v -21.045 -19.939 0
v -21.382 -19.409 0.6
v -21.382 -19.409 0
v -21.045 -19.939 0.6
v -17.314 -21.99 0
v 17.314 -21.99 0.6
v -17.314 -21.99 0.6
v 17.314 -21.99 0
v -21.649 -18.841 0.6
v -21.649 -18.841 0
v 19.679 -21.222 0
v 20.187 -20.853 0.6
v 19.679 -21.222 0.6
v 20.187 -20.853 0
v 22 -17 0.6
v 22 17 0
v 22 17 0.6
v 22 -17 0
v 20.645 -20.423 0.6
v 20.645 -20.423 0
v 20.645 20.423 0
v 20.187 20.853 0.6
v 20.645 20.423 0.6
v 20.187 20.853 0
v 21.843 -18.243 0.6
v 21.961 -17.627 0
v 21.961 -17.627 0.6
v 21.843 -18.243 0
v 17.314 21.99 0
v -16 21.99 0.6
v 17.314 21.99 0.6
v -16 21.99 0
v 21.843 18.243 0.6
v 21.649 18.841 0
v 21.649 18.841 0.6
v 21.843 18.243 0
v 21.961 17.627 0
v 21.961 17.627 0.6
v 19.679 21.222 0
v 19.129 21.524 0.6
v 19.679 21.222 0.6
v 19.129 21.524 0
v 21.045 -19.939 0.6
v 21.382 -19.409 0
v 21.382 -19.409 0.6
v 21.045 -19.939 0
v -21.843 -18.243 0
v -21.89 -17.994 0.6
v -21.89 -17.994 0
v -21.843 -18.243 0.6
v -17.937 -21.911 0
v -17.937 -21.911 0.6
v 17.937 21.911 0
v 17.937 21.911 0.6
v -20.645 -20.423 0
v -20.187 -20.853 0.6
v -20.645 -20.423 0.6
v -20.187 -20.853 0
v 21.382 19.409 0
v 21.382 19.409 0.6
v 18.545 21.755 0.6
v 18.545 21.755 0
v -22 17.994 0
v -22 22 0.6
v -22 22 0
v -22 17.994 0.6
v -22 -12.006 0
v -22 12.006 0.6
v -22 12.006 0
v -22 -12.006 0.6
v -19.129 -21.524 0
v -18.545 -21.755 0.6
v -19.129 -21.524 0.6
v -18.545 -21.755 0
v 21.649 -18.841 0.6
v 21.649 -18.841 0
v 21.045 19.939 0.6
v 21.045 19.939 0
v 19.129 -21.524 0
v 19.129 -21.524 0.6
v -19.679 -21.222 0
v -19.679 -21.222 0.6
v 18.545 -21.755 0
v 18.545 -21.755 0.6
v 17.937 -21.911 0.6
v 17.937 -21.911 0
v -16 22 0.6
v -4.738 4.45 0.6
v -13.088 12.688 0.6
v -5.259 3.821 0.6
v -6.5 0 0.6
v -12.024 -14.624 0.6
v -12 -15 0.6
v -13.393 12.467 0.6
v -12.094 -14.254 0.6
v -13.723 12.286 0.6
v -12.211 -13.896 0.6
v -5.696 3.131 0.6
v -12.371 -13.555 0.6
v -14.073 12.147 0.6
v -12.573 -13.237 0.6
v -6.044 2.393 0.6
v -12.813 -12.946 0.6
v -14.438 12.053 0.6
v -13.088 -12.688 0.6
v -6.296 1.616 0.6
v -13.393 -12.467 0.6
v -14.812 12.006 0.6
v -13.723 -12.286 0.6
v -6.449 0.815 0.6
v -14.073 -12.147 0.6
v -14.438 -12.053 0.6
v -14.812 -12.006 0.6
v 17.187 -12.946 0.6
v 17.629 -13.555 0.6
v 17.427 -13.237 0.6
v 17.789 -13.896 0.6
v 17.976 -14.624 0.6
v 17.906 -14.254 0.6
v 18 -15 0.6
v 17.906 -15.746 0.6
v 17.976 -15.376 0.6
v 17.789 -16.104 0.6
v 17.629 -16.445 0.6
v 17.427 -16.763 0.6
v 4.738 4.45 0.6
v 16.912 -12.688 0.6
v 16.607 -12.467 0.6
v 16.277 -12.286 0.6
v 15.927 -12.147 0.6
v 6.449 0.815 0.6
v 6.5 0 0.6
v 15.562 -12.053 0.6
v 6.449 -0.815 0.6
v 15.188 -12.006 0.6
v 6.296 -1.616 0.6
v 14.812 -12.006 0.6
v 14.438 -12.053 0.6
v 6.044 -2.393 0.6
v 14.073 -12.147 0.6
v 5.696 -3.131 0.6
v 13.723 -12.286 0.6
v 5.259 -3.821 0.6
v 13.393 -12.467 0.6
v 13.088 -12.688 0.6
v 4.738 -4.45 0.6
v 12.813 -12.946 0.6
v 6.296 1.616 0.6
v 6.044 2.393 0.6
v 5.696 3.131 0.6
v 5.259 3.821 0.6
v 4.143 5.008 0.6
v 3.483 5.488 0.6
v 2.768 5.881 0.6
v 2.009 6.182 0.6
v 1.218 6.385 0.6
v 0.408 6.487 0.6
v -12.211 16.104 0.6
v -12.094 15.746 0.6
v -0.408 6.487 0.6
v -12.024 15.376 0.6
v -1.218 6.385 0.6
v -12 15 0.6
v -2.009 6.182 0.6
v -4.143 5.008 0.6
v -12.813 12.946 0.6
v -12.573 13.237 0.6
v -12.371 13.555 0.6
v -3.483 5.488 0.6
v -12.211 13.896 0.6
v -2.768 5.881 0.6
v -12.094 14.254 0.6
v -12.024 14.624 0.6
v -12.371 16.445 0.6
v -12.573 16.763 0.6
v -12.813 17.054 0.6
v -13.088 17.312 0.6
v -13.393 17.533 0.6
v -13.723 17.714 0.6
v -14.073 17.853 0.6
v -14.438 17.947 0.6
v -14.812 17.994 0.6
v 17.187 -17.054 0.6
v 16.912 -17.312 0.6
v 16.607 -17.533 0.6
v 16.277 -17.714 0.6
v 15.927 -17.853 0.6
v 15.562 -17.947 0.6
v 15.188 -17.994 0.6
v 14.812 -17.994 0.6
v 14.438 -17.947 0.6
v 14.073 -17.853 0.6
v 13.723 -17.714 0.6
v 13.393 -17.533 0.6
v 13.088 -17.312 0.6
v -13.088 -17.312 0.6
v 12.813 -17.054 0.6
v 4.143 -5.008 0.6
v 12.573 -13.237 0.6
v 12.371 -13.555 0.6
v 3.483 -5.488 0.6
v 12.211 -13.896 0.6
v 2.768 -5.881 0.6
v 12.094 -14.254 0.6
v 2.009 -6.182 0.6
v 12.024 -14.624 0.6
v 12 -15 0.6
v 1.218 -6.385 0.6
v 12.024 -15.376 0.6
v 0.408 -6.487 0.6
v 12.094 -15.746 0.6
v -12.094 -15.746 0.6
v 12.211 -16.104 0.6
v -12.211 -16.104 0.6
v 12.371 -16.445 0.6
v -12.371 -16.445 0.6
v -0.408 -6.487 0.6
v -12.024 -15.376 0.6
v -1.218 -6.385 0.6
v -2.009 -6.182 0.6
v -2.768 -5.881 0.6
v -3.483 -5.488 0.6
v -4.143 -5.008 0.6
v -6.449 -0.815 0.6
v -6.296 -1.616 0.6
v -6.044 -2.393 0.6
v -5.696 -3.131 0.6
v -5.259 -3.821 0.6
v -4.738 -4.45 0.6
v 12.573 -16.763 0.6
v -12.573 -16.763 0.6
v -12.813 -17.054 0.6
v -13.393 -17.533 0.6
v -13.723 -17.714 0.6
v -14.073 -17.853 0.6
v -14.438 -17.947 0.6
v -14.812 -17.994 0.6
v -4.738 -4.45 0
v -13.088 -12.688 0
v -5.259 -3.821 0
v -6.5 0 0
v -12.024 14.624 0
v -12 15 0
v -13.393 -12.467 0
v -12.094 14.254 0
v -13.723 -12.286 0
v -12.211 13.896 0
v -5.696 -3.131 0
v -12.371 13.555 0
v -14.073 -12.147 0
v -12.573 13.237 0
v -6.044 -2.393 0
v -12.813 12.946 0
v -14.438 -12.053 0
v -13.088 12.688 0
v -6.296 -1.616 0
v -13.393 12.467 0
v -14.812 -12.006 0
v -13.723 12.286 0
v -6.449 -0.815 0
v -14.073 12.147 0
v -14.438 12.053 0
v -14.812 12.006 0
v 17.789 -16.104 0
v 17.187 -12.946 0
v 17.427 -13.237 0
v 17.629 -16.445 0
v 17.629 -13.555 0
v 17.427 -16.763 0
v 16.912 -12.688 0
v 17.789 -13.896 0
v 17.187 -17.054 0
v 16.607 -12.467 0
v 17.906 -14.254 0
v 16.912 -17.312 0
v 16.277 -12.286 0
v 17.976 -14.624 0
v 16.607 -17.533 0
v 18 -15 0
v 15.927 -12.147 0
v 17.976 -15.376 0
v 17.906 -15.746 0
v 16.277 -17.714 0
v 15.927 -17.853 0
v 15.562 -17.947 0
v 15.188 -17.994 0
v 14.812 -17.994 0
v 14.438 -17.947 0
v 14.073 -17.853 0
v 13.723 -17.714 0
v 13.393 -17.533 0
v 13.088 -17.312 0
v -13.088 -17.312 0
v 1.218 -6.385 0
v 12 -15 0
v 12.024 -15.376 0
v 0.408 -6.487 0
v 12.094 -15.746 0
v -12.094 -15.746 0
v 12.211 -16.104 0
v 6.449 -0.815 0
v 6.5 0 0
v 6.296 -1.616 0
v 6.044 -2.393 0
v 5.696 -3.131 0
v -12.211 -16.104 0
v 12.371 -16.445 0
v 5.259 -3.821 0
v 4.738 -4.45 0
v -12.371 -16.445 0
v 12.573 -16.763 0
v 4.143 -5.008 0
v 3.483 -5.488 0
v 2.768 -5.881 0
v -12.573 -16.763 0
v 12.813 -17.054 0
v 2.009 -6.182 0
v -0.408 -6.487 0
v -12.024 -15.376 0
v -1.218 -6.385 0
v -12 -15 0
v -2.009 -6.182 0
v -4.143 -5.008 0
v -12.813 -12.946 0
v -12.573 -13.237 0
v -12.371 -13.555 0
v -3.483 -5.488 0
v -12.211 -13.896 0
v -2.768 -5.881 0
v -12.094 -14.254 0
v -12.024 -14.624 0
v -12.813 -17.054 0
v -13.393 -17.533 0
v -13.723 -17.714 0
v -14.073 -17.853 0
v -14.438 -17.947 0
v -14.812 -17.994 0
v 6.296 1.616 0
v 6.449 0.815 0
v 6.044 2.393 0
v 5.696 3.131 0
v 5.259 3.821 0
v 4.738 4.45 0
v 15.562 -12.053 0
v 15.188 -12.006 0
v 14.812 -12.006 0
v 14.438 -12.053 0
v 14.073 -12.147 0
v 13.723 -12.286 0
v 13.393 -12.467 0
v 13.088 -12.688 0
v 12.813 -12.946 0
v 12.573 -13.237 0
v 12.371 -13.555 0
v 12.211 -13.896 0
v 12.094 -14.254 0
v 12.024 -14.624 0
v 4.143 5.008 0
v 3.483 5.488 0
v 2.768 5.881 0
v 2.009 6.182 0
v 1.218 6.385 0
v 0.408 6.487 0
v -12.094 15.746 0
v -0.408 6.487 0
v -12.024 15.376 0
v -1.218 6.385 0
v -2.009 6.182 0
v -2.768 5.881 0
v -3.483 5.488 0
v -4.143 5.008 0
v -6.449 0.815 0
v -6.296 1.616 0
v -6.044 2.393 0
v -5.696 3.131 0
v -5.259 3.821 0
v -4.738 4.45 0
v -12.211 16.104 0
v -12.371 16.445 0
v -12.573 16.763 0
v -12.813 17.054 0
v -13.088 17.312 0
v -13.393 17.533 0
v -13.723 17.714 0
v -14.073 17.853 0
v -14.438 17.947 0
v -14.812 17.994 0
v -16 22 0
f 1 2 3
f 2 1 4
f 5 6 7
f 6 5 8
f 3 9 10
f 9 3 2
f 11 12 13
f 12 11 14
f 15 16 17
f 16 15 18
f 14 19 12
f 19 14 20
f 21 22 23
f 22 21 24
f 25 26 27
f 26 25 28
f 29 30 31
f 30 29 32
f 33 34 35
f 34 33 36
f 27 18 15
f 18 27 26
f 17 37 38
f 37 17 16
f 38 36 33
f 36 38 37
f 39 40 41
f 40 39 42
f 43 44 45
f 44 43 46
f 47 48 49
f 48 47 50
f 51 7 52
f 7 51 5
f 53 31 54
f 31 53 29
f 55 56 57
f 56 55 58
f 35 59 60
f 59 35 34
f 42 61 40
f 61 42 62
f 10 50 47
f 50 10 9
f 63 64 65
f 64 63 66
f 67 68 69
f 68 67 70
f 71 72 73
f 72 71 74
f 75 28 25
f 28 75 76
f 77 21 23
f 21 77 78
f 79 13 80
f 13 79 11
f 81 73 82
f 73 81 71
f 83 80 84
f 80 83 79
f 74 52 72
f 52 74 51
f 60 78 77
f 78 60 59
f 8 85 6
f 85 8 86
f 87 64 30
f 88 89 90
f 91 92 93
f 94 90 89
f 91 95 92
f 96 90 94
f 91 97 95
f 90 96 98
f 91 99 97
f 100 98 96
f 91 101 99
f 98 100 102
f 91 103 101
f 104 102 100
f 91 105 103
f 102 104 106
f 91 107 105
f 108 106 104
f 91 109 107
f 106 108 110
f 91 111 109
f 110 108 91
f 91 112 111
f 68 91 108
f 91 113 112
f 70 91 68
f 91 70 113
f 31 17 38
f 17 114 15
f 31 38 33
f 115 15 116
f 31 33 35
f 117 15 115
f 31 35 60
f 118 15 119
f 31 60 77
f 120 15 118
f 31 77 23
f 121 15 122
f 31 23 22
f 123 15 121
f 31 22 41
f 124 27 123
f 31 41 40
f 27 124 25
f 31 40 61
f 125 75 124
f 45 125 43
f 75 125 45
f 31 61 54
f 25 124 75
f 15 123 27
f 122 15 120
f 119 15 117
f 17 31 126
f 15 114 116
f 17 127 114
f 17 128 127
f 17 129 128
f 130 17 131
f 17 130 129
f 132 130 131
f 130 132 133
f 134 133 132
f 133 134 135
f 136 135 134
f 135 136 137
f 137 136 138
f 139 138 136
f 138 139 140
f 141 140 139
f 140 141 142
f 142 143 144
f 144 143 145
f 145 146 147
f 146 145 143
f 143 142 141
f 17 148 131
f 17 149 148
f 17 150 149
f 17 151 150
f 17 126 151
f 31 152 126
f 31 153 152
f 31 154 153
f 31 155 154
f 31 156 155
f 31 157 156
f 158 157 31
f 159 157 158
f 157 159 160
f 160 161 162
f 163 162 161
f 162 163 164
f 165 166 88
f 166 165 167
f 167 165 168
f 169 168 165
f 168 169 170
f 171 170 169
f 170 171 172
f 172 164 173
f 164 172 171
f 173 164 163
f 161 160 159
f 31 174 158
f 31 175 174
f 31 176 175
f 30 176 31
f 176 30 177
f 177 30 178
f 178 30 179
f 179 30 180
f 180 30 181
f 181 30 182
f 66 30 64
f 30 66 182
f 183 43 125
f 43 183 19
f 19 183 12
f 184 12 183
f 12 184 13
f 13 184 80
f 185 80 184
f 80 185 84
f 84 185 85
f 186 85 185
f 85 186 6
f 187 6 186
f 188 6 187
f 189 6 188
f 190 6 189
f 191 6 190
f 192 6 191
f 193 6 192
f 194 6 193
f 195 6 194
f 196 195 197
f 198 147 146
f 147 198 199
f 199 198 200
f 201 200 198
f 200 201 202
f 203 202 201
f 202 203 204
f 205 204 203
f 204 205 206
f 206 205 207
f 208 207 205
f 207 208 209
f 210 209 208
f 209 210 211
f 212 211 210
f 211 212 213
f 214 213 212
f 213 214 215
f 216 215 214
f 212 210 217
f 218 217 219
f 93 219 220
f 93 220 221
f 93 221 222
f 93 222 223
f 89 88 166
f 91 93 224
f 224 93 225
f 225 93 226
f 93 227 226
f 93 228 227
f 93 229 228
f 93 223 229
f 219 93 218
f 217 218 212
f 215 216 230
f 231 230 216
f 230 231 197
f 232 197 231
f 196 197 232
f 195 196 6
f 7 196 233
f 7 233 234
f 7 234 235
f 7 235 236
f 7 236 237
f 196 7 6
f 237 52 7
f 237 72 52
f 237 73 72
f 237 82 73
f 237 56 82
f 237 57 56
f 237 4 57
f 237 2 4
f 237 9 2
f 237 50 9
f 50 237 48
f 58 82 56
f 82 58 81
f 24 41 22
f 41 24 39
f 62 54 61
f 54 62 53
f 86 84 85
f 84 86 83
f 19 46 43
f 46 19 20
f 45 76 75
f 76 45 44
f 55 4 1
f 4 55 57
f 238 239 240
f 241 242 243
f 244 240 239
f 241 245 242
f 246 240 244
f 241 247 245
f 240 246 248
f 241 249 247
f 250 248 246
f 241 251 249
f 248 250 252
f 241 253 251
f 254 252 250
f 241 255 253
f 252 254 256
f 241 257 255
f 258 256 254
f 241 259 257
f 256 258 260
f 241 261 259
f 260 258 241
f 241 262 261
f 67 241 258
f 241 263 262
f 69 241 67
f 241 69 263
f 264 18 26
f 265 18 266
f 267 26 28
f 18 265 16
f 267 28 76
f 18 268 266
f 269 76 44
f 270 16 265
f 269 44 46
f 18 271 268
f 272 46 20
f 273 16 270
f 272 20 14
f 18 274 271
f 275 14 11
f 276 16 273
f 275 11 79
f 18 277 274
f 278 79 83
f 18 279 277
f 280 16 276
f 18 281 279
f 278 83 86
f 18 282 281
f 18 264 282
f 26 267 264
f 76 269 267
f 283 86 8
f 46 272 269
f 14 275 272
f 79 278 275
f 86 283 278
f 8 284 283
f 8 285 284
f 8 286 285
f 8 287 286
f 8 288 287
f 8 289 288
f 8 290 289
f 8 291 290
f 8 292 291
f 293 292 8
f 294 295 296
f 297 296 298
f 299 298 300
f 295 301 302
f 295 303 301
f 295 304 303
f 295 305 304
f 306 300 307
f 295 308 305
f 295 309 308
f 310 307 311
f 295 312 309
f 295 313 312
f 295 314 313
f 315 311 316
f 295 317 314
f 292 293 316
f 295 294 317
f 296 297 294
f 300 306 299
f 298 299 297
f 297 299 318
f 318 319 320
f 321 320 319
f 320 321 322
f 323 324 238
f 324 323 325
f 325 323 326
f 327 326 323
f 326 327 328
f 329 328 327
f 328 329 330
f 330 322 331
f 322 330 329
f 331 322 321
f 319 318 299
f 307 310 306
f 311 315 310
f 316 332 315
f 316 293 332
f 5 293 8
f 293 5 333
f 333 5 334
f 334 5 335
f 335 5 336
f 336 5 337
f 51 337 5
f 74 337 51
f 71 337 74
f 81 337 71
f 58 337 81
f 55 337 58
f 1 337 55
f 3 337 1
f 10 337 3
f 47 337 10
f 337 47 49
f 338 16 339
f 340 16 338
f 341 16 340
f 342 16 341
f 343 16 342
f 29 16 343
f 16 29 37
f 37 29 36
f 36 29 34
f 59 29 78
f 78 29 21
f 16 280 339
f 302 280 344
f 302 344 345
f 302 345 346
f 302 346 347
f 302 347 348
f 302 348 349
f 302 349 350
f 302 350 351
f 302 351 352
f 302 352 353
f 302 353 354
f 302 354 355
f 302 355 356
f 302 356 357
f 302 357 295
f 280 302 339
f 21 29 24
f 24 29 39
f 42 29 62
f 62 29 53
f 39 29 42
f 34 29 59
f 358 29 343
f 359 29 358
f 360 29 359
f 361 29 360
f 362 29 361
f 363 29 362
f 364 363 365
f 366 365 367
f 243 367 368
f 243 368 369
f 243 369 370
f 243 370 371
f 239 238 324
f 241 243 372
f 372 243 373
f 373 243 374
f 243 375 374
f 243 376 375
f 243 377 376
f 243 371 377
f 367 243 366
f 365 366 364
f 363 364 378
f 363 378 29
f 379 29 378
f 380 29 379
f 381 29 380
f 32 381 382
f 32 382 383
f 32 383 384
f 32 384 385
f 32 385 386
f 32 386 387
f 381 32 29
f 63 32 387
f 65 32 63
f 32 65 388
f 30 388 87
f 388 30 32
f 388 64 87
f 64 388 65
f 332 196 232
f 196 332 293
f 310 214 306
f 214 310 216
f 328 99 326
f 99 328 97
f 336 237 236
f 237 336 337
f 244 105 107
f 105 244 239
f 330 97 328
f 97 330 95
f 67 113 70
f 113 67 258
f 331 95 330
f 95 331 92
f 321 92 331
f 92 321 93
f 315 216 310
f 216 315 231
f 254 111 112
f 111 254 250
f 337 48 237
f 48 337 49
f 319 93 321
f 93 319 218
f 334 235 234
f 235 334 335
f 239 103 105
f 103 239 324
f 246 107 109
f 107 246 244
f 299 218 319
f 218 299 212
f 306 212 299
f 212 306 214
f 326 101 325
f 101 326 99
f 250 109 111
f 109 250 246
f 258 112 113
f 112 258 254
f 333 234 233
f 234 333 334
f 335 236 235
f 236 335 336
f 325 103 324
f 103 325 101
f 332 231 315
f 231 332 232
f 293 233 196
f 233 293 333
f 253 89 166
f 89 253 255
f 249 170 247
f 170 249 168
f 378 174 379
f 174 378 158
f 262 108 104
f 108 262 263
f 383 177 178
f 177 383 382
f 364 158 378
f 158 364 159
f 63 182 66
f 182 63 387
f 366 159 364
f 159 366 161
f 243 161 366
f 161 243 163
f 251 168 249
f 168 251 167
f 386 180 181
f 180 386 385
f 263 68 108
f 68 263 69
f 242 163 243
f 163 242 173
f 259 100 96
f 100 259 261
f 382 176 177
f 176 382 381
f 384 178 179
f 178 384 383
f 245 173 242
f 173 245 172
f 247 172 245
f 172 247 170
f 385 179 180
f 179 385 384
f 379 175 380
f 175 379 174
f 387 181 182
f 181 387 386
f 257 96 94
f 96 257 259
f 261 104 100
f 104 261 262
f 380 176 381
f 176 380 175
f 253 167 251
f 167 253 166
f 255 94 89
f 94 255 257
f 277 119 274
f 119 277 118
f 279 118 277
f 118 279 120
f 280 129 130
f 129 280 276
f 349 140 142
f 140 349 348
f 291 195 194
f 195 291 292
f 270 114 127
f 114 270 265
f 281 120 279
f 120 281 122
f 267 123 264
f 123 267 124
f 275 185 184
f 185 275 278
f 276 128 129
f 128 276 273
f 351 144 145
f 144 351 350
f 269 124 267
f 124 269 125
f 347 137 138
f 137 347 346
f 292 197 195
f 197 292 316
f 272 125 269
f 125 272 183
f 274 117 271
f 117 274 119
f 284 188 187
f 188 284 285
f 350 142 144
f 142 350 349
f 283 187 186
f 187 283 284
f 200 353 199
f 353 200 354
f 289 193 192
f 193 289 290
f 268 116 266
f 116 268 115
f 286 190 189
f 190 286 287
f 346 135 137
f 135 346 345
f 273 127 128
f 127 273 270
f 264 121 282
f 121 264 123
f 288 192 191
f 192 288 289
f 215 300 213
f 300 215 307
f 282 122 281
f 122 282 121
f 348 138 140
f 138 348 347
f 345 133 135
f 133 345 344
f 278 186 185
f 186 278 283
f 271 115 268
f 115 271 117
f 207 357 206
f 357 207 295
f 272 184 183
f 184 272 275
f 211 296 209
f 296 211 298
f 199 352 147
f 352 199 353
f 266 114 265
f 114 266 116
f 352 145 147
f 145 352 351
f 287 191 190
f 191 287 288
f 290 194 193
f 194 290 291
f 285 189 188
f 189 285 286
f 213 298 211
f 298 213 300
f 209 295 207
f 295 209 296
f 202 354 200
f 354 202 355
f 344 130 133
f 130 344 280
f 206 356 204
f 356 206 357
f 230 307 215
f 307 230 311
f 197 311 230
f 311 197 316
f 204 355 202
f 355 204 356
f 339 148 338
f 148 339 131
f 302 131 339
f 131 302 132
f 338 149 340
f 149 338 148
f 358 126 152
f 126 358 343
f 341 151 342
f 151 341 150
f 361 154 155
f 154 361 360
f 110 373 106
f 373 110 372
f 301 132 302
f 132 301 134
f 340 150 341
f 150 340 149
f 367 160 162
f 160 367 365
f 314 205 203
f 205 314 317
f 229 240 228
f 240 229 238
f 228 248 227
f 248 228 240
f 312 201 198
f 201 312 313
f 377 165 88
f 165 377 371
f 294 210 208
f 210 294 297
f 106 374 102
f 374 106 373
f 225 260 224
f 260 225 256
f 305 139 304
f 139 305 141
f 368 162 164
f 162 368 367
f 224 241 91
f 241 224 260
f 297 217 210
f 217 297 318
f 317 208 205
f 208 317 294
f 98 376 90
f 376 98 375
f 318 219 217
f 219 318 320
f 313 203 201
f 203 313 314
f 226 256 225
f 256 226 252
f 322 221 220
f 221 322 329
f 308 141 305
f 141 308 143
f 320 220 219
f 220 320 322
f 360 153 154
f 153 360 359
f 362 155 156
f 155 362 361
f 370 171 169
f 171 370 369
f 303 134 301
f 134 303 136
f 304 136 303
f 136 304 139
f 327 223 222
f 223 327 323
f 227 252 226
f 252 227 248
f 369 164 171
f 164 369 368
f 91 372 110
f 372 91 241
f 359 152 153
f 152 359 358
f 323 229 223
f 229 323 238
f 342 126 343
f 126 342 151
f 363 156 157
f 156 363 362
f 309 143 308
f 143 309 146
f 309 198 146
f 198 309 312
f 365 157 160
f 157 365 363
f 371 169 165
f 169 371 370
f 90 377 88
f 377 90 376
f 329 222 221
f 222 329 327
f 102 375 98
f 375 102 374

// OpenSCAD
$fn = 50;


difference() {
	union() {
		translate(v = [0, 0, 0]) {
			rotate(a = [0, 0, 0]) {
				hull() {
					translate(v = [-17.0000000000, 17.0000000000, 0]) {
						rotate(a = [0, 0, 0]) {
							translate(v = [0, 0, 0]) {
								rotate(a = [0, 0, 0]) {
									cylinder(h = 0.6000000000, r = 5);
								}
							}
						}
					}
					translate(v = [17.0000000000, 17.0000000000, 0]) {
						rotate(a = [0, 0, 0]) {
							translate(v = [0, 0, 0]) {
								rotate(a = [0, 0, 0]) {
									cylinder(h = 0.6000000000, r = 5);
								}
							}
						}
					}
					translate(v = [-17.0000000000, -17.0000000000, 0]) {
						rotate(a = [0, 0, 0]) {
							translate(v = [0, 0, 0]) {
								rotate(a = [0, 0, 0]) {
									cylinder(h = 0.6000000000, r = 5);
								}
							}
						}
					}
					translate(v = [17.0000000000, -17.0000000000, 0]) {
						rotate(a = [0, 0, 0]) {
							translate(v = [0, 0, 0]) {
								rotate(a = [0, 0, 0]) {
									cylinder(h = 0.6000000000, r = 5);
								}
							}
						}
					}
				}
			}
		}
		translate(v = [-22.0000000000, 16.0000000000, 0]) {
			rotate(a = [0, 0, 0]) {
				cube(size = [6, 6, 0.6000000000]);
			}
		}
	}
	union() {
		translate(v = [-22.5000000000, -15.0000000000, -125]) {
			rotate(a = [0, 0, 0]) {
				hull() {
					translate(v = [7.5000000000, 0, 0]) {
						rotate(a = [0, 0, 0]) {
							translate(v = [0, 0, 0]) {
								rotate(a = [0, 0, 0]) {
									cylinder(h = 250, r = 3.0000000000);
								}
							}
						}
					}
					translate(v = [-7.5000000000, 0, 0]) {
						rotate(a = [0, 0, 0]) {
							translate(v = [0, 0, 0]) {
								rotate(a = [0, 0, 0]) {
									cylinder(h = 250, r = 3.0000000000);
								}
							}
						}
					}
				}
			}
		}
		translate(v = [-22.5000000000, 15.0000000000, -125]) {
			rotate(a = [0, 0, 0]) {
				hull() {
					translate(v = [7.5000000000, 0, 0]) {
						rotate(a = [0, 0, 0]) {
							translate(v = [0, 0, 0]) {
								rotate(a = [0, 0, 0]) {
									cylinder(h = 250, r = 3.0000000000);
								}
							}
						}
					}
					translate(v = [-7.5000000000, 0, 0]) {
						rotate(a = [0, 0, 0]) {
							translate(v = [0, 0, 0]) {
								rotate(a = [0, 0, 0]) {
									cylinder(h = 250, r = 3.0000000000);
								}
							}
						}
					}
				}
			}
		}
		translate(v = [15.0000000000, -15.0000000000, -125.0000000000]) {
			rotate(a = [0, 0, 0]) {
				cylinder(h = 250, r = 3.0000000000);
			}
		}
		translate(v = [0, 0, 0.0000000000]) {
			rotate(a = [0, 0, 0]) {
				cylinder(h = 0.6000000000, r = 6.5000000000);
			}
		}
	}
}
